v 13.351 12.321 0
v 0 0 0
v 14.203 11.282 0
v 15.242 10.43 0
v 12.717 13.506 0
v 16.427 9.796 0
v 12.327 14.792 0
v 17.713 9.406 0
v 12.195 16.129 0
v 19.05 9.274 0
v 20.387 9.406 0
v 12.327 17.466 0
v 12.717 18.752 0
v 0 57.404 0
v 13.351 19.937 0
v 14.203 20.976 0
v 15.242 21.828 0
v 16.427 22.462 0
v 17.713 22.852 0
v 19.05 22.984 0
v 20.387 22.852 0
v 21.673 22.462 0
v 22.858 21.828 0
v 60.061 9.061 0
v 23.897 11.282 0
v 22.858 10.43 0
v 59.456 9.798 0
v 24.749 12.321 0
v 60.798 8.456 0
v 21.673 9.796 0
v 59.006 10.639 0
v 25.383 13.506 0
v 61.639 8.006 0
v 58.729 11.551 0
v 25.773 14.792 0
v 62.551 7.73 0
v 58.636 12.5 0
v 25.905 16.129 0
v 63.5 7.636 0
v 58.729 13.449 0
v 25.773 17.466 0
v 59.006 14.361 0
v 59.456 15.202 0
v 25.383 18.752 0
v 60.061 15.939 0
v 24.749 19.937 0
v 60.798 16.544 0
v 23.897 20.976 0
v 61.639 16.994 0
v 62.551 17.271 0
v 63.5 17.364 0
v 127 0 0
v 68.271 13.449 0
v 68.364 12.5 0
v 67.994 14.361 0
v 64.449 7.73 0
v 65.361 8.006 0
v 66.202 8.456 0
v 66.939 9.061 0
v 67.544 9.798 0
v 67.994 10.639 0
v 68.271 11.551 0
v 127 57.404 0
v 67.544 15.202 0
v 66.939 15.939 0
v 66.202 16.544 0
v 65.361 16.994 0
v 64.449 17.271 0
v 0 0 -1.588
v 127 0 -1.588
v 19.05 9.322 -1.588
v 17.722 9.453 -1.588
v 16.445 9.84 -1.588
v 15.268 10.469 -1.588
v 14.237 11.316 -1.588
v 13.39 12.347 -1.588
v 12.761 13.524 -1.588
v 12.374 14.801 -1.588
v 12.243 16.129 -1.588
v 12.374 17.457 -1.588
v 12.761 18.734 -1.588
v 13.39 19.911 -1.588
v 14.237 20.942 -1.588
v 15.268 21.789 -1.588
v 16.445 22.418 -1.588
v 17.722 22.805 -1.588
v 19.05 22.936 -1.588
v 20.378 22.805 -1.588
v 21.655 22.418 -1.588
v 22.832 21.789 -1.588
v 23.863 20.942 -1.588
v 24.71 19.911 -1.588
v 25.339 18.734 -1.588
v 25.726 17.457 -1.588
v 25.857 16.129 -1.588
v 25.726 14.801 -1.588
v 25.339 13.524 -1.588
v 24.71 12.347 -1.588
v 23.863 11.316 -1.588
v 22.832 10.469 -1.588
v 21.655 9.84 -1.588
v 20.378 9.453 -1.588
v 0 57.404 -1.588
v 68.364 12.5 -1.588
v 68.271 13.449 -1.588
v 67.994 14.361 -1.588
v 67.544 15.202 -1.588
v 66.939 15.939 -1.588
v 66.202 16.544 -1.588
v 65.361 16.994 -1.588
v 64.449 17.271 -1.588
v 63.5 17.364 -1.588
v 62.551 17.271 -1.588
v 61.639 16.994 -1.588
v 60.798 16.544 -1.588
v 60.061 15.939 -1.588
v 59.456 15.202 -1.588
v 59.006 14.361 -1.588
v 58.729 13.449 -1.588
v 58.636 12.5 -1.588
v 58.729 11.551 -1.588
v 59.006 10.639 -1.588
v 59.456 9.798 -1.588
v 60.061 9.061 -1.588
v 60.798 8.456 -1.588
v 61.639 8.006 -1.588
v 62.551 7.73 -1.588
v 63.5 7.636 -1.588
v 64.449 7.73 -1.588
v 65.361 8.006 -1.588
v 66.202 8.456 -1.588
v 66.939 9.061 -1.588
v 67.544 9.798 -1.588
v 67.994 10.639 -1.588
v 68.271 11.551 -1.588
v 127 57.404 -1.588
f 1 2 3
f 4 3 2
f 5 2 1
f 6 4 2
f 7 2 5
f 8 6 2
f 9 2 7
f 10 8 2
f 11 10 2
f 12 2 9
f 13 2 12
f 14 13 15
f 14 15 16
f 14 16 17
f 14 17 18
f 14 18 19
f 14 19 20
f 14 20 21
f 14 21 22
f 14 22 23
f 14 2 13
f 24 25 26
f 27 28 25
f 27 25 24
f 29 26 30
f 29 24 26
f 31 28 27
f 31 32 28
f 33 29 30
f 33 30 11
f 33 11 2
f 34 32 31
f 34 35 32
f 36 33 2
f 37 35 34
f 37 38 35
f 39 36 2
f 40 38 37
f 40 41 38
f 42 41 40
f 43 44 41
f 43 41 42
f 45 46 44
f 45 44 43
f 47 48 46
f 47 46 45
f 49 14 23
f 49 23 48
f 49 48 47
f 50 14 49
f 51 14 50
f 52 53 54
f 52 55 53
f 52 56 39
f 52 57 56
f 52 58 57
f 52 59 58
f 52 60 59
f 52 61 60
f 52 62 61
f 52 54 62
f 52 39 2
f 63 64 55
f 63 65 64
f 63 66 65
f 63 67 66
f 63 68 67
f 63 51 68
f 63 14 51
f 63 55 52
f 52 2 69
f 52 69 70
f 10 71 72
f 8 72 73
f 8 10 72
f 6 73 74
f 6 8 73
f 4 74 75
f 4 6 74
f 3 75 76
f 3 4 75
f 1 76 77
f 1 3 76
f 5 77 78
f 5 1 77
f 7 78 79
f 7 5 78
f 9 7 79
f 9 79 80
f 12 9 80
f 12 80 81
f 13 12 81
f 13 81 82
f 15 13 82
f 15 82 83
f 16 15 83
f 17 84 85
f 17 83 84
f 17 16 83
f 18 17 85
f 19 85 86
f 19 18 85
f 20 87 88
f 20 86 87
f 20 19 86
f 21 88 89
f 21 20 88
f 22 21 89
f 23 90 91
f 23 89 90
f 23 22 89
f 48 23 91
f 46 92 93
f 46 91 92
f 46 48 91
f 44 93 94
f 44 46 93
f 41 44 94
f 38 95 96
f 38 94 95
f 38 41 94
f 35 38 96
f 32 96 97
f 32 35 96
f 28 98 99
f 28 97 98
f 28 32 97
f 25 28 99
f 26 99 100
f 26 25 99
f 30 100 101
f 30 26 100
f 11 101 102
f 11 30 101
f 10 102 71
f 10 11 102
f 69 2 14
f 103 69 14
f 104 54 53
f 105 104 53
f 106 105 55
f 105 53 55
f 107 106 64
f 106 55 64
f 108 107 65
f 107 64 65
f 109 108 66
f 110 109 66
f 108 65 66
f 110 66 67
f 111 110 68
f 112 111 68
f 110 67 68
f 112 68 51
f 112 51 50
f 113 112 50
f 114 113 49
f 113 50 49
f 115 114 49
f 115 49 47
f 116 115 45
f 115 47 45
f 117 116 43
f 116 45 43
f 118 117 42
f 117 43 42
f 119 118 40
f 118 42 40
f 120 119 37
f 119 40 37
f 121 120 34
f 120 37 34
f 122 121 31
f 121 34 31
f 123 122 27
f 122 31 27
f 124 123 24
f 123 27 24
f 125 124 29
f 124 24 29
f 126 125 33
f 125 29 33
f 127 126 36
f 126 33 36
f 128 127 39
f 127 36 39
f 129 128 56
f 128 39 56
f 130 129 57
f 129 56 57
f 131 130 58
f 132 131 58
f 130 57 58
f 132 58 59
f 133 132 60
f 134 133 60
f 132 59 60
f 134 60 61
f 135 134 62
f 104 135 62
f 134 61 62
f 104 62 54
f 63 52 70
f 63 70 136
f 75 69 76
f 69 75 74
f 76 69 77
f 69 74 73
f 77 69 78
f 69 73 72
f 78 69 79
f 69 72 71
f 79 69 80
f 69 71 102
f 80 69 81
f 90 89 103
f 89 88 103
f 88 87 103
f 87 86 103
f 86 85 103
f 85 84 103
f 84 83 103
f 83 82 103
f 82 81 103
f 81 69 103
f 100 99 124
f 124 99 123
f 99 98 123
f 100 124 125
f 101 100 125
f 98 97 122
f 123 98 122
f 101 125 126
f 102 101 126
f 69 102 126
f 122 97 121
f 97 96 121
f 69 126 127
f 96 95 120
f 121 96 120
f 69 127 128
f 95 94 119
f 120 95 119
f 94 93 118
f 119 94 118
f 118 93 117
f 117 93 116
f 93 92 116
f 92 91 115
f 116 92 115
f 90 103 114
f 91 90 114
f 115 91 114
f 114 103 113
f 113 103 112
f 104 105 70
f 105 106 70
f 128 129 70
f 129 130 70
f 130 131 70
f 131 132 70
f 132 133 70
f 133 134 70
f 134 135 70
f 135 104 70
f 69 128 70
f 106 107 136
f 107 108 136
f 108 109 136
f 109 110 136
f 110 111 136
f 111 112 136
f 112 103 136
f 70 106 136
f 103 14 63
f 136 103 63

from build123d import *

# Parameters (mm, degrees)
SKETCH2_W           = 127
SKETCH2_H           = 57.404
SKETCH2_R           = 4.864
BOSS_EXTRUDE1_DEPTH = 1.5875


with BuildPart() as part:
    # Sketch2 → Boss-Extrude1 (new body)
    with BuildSketch(Plane.XY):
        with Locations((63.5, 28.702)):
            Rectangle(SKETCH2_W, SKETCH2_H)
        with Locations((63.5, 12.500102)):
            Circle(SKETCH2_R, mode=Mode.SUBTRACT)
    extrude(amount=-BOSS_EXTRUDE1_DEPTH)

    # Sketch3 → 1/4 NPT Tapped Hole1 (revolve, cut)
    with BuildSketch(Plane(origin=(19.05, 16.129, 0), x_dir=(0, -1, 0), z_dir=(1, 0, 0))):
        Polygon((0, 0), (0, 1.5875), (5.5626, 1.5875), (5.5626, 9.906), (6.557984794, 9.906), (6.8545837, 0), align=None)
    revolve(axis=Axis((19.05, 16.129, 6.35), (0, 0, -1)), mode=Mode.SUBTRACT)


solid = part.part
